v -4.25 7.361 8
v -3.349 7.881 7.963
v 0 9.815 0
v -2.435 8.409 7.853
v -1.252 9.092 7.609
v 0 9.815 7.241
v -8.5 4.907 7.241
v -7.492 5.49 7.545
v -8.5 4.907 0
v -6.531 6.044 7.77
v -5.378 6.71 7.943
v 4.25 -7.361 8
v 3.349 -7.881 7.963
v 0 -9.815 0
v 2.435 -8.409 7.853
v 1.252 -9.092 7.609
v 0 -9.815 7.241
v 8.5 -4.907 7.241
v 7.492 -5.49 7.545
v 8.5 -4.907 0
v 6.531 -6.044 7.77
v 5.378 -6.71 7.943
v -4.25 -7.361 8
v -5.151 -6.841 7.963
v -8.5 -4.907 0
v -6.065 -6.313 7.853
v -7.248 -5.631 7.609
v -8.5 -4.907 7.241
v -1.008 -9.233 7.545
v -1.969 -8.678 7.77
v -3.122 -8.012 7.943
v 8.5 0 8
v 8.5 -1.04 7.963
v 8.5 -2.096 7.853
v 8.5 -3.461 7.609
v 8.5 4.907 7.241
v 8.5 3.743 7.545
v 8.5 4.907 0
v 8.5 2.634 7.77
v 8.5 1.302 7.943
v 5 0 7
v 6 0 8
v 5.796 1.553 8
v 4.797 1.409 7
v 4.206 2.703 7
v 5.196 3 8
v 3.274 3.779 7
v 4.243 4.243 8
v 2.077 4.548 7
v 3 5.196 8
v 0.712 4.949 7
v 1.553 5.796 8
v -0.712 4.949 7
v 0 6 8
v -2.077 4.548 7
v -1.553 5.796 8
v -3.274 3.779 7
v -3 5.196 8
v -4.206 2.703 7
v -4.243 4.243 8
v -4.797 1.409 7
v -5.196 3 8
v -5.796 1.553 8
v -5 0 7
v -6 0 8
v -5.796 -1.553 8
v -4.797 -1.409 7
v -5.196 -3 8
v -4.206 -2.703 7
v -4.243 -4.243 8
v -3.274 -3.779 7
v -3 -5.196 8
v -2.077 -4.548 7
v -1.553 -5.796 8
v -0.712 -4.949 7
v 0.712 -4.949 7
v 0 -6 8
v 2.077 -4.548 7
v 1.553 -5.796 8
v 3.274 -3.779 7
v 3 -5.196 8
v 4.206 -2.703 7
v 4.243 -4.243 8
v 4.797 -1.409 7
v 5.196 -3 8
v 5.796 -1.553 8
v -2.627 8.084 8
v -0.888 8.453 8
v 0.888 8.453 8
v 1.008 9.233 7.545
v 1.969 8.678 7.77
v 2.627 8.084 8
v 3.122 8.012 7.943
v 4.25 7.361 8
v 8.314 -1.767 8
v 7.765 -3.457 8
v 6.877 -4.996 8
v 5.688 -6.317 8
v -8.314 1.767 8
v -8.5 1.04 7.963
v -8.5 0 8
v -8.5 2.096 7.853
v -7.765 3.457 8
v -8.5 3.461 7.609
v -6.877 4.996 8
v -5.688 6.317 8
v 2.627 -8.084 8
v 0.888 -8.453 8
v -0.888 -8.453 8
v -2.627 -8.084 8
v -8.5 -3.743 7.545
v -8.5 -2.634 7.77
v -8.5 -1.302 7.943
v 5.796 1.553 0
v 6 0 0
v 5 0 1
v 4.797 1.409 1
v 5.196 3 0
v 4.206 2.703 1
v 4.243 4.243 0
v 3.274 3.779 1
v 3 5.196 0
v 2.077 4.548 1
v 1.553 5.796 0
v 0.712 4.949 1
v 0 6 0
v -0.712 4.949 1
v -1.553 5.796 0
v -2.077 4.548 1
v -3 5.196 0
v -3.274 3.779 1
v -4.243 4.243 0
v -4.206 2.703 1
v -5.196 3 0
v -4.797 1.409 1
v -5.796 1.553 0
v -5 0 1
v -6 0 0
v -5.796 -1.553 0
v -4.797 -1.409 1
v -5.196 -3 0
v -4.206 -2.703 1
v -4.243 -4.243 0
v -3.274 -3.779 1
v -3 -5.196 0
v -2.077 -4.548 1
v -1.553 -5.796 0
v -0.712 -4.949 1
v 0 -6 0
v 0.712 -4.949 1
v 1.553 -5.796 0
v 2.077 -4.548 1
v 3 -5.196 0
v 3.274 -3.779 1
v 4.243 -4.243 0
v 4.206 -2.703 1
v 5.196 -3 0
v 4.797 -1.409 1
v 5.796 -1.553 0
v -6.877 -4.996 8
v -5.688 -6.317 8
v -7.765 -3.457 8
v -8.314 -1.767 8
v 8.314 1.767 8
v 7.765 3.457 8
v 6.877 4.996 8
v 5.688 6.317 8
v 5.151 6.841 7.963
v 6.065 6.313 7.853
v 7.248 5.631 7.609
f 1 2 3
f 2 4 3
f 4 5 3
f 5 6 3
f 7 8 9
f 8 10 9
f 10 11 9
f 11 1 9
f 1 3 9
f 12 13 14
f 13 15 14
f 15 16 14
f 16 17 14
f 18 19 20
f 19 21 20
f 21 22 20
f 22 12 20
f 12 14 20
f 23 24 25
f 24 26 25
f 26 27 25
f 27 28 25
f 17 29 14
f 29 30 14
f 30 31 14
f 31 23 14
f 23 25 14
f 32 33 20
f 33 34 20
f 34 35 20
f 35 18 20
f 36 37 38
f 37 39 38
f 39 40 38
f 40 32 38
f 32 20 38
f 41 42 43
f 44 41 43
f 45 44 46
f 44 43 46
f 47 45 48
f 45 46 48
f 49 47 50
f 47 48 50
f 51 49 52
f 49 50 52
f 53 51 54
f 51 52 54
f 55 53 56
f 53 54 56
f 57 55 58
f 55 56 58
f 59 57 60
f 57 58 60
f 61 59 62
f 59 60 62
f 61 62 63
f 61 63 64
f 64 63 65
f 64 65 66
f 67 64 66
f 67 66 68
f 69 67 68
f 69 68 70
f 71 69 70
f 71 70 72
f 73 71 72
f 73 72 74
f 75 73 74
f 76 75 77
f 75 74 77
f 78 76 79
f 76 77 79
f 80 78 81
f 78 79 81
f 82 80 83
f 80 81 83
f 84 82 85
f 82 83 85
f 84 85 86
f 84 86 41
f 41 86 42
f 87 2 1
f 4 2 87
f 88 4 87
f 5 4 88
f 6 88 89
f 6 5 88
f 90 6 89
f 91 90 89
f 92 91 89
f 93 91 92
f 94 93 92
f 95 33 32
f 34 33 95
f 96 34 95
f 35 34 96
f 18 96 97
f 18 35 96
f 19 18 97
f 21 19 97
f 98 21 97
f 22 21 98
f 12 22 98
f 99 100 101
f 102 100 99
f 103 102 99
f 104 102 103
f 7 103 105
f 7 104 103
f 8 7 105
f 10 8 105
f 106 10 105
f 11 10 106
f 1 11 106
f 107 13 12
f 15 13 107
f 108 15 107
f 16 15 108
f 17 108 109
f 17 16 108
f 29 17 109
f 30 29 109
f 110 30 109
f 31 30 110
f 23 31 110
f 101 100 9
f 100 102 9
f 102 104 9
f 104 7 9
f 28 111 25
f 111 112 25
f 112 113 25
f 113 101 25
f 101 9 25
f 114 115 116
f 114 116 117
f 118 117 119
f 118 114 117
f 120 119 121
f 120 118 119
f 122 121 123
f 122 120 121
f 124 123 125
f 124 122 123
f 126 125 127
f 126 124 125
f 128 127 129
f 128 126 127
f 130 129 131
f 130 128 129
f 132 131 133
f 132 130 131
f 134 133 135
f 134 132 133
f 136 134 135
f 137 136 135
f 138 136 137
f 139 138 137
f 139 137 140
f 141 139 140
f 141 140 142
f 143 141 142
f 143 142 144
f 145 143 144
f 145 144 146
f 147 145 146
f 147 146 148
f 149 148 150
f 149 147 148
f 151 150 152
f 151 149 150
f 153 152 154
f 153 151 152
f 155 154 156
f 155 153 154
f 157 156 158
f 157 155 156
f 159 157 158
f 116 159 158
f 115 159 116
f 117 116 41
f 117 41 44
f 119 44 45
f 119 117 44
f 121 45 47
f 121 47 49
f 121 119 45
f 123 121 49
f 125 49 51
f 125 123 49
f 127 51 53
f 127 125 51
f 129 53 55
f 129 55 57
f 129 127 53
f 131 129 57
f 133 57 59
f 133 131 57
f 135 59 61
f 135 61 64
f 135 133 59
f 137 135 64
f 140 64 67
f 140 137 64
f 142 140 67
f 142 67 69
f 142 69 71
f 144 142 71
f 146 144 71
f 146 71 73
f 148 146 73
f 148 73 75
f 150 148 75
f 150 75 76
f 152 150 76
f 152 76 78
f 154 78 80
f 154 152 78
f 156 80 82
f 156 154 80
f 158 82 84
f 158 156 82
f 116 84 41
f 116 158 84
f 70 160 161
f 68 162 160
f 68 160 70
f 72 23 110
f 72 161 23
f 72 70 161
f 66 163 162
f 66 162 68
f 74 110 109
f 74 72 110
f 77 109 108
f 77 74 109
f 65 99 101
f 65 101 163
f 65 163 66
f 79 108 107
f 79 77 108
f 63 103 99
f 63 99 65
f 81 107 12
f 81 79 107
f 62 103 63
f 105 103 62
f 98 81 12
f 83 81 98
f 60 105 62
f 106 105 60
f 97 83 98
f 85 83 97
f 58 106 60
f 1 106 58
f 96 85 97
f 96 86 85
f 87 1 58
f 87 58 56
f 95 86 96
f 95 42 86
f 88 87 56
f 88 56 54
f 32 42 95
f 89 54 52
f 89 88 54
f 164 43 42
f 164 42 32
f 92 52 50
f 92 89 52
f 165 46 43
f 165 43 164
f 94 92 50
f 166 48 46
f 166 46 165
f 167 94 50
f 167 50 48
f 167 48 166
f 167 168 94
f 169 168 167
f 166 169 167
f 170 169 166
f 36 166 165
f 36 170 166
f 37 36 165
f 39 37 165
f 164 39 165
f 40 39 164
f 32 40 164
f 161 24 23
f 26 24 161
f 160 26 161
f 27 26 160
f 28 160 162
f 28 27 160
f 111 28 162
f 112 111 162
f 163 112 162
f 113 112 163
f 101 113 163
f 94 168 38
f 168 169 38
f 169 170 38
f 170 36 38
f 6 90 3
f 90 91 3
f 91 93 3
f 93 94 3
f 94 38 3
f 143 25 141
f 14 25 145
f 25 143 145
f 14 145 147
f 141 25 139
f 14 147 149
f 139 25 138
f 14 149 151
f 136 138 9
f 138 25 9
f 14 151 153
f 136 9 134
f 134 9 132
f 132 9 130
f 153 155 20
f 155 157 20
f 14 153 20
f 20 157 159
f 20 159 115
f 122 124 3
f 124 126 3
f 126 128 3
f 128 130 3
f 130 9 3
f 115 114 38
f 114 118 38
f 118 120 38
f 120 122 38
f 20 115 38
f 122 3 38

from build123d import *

# Parameters (mm, degrees)
F0_R     = 5
F1_DEPTH = 8
F2_SIZE  = 1


with BuildPart() as f1:
    # F0 (on Top) → F1 (new body)
    with BuildSketch(Plane.XY):
        Polygon((0, -9.814955), (8.5, -4.907477), (8.5, 4.907477), (0, 9.814955), (-8.5, 4.907477), (-8.5, -4.907477), align=None)
        Circle(F0_R, mode=Mode.SUBTRACT)
    extrude(amount=F1_DEPTH)

    # F2
    f2_edges = [f1.edges().sort_by_distance(p)[0] for p in [
        (-5, 0, 8),
        (-5, 0, 0),
    ]]
    chamfer(f2_edges, length=F2_SIZE)

    # F3 (on Front) → F4 (revolve, cut)
    with BuildSketch(Plane.XZ):
        Polygon((18.032537, 8), (8.5, 8), (18.032537, 2.496387), align=None)
    revolve(axis=Axis((0, 0, 4), (0, 0, -1)), mode=Mode.SUBTRACT)


solid = f1.part
